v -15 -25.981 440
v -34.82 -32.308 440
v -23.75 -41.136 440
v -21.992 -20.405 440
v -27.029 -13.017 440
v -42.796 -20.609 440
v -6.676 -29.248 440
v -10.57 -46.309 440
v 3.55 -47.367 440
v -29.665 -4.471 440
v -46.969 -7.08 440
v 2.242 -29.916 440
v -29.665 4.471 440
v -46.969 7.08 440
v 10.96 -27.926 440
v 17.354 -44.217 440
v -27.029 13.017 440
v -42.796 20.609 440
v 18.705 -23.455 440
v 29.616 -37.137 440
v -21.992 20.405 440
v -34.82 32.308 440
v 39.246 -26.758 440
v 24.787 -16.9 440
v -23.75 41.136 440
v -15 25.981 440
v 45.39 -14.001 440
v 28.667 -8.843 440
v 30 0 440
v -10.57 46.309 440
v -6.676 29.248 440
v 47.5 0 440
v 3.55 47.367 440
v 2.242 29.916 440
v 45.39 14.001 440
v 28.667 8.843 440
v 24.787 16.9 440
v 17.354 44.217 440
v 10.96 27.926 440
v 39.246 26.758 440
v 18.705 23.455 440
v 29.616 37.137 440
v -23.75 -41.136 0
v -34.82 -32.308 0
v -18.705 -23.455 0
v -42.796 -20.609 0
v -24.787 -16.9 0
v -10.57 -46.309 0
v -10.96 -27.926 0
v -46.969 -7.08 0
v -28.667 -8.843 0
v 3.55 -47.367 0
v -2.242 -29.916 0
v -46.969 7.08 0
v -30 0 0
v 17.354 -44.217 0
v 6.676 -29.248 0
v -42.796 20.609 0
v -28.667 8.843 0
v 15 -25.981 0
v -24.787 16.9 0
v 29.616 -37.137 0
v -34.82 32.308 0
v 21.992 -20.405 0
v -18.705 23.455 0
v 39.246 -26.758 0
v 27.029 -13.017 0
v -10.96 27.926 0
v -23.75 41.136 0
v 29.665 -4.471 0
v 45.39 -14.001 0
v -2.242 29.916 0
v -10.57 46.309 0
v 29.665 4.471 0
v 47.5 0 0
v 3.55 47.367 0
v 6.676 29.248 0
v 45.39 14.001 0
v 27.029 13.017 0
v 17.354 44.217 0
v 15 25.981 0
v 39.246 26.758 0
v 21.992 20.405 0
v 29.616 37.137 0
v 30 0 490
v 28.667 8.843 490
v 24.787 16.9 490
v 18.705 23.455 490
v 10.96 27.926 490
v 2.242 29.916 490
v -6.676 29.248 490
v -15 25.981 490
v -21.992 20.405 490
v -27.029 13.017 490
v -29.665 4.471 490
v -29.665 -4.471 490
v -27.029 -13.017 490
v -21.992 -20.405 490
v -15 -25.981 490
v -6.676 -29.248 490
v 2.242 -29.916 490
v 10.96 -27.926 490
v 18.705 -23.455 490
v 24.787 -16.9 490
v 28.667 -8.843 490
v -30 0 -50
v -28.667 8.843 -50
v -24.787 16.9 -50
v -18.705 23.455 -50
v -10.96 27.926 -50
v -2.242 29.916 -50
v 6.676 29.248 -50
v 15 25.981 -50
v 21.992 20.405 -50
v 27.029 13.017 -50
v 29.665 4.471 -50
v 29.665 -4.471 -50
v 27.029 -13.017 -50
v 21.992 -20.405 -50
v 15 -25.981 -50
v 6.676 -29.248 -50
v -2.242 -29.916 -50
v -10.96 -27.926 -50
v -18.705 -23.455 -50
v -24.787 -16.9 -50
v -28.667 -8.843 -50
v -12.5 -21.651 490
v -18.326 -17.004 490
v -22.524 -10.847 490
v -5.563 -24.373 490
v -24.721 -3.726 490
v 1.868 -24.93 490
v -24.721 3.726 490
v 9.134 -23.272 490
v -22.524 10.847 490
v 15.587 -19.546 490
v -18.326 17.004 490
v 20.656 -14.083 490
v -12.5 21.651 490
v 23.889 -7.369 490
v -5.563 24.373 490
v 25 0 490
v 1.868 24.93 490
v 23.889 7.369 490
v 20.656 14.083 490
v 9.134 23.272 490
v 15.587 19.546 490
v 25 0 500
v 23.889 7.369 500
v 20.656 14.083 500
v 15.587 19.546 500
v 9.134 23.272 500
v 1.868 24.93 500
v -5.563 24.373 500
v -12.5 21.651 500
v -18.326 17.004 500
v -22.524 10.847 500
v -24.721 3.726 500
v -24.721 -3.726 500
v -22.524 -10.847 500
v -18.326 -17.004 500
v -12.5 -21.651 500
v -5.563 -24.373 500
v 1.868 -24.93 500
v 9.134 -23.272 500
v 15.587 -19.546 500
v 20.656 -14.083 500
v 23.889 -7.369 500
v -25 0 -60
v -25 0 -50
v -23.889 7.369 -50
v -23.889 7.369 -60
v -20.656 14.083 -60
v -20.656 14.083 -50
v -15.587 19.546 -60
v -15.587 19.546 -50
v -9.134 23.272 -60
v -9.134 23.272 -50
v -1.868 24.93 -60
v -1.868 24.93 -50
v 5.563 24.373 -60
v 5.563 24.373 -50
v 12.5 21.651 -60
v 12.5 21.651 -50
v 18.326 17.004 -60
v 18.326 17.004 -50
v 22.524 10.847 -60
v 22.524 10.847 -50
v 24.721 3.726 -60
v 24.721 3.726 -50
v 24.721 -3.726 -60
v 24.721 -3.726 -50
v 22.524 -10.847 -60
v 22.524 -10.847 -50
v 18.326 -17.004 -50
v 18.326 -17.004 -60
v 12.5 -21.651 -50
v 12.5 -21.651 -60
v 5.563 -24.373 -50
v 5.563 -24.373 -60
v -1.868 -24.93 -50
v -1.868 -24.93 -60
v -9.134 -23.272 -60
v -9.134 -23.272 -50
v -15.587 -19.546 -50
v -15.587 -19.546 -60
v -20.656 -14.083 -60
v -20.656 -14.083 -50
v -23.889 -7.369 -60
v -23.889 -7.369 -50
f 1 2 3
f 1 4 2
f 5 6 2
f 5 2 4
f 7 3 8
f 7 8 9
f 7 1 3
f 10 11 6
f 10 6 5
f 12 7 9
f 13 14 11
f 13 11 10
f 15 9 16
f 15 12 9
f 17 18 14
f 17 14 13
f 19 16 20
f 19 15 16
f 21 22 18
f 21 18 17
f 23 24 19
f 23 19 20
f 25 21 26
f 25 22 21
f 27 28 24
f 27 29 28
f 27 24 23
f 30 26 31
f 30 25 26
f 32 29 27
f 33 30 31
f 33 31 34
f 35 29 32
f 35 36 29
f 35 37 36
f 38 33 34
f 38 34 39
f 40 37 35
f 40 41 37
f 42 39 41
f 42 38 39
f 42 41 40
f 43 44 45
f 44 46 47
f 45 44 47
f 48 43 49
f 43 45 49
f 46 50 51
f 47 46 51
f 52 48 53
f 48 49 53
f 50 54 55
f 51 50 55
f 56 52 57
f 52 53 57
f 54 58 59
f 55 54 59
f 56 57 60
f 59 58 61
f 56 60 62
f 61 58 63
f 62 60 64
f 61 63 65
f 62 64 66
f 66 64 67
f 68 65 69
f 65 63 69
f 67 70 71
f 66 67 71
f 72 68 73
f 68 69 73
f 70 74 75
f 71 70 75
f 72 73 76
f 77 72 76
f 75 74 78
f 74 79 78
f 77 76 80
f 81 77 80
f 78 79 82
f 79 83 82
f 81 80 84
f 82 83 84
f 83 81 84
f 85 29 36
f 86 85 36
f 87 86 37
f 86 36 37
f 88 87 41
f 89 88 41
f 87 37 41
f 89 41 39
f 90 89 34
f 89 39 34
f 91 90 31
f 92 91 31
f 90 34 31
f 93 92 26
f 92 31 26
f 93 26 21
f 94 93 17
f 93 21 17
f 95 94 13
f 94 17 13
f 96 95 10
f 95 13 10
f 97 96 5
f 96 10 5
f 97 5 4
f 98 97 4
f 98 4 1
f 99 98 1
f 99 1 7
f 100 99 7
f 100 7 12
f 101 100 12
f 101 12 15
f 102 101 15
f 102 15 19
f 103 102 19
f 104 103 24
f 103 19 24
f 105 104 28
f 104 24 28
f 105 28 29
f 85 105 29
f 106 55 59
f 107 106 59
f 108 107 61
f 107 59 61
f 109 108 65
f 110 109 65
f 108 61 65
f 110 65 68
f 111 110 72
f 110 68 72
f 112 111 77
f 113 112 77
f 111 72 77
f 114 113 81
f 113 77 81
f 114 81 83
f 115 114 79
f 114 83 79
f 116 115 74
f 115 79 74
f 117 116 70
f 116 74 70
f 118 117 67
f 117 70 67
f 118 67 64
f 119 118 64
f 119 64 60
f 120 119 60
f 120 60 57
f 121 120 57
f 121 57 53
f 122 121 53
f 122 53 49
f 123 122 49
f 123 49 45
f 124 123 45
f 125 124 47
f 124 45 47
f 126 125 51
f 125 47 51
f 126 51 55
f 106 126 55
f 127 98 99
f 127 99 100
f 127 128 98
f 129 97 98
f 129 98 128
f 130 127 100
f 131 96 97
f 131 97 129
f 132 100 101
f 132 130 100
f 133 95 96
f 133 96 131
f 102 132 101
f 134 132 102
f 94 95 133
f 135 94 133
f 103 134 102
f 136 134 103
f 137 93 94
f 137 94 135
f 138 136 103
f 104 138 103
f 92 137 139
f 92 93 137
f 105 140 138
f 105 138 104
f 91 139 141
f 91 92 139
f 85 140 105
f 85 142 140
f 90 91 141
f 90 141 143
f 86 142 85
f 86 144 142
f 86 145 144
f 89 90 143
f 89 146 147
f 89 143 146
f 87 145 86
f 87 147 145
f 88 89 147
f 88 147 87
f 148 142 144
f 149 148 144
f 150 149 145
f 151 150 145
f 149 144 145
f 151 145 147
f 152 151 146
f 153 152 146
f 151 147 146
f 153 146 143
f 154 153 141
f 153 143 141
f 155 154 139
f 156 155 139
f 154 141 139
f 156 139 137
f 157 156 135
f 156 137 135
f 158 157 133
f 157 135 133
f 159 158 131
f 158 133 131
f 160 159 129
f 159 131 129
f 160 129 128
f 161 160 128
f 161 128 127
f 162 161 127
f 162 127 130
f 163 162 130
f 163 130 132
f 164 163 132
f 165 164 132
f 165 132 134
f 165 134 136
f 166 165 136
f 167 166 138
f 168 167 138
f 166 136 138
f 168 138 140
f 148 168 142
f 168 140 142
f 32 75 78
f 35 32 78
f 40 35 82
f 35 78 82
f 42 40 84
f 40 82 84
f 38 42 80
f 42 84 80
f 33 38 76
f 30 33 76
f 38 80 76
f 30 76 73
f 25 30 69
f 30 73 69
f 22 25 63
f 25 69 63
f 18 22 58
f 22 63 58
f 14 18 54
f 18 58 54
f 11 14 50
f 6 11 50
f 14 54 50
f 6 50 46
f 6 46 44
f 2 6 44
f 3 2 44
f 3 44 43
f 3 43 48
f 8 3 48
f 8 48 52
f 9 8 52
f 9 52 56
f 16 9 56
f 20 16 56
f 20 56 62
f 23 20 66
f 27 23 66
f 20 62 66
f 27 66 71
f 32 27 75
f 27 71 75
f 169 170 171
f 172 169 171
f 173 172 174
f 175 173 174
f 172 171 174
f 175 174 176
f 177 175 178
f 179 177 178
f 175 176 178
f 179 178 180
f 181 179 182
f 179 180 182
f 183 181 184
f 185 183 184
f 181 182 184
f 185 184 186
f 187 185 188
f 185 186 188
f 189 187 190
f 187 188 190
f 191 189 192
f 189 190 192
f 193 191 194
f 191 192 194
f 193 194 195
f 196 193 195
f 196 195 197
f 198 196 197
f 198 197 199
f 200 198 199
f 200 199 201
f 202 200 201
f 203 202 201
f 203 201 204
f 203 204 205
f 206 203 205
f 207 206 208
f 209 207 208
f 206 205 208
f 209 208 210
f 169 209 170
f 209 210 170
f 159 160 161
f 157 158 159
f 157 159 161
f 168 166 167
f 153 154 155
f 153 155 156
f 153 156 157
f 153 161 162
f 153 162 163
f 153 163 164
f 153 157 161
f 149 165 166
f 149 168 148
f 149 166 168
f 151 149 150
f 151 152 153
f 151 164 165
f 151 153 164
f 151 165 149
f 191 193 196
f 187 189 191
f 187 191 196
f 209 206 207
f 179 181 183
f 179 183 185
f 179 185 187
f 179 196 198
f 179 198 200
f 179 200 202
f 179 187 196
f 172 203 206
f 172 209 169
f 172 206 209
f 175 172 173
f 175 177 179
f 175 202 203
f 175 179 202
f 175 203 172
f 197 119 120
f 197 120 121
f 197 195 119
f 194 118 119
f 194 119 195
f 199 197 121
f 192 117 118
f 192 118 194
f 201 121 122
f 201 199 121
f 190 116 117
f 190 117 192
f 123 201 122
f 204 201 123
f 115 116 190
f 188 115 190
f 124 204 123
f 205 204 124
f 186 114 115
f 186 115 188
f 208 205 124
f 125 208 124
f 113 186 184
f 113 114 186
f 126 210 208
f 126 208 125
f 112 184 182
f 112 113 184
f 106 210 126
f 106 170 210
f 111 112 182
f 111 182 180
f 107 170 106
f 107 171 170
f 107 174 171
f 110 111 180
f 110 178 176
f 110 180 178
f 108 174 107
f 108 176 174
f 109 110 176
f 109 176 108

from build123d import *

# Parameters (mm, degrees)
SKETCH1_R           = 47.5
BOSS_EXTRUDE1_DEPTH = 440
SKETCH2_R           = 30
BOSS_EXTRUDE2_DEPTH = 50
SKETCH3_R           = 30
BOSS_EXTRUDE3_DEPTH = 50
SKETCH4_R           = 25
BOSS_EXTRUDE4_DEPTH = 10
SKETCH5_R           = 25
BOSS_EXTRUDE5_DEPTH = 10


with BuildPart() as part:
    # Sketch1 → Boss-Extrude1 (new body)
    with BuildSketch(Plane.XY):
        Circle(SKETCH1_R)
    extrude(amount=BOSS_EXTRUDE1_DEPTH)

    # Sketch2 → Boss-Extrude2 (add)
    with BuildSketch(Plane(origin=(0, 0, 0), x_dir=(-1, 0, 0), z_dir=(0, 0, -1))):
        Circle(SKETCH2_R)
    extrude(amount=BOSS_EXTRUDE2_DEPTH)

    # Sketch3 → Boss-Extrude3 (add)
    with BuildSketch(Plane.XY.offset(440)):
        Circle(SKETCH3_R)
    extrude(amount=BOSS_EXTRUDE3_DEPTH)

    # Sketch4 → Boss-Extrude4 (add)
    with BuildSketch(Plane.XY.offset(490)):
        Circle(SKETCH4_R)
    extrude(amount=BOSS_EXTRUDE4_DEPTH)

    # Sketch5 → Boss-Extrude5 (add)
    with BuildSketch(Plane(origin=(0, 0, -50), x_dir=(-1, 0, 0), z_dir=(0, 0, -1))):
        Circle(SKETCH5_R)
    extrude(amount=BOSS_EXTRUDE5_DEPTH)


solid = part.part
